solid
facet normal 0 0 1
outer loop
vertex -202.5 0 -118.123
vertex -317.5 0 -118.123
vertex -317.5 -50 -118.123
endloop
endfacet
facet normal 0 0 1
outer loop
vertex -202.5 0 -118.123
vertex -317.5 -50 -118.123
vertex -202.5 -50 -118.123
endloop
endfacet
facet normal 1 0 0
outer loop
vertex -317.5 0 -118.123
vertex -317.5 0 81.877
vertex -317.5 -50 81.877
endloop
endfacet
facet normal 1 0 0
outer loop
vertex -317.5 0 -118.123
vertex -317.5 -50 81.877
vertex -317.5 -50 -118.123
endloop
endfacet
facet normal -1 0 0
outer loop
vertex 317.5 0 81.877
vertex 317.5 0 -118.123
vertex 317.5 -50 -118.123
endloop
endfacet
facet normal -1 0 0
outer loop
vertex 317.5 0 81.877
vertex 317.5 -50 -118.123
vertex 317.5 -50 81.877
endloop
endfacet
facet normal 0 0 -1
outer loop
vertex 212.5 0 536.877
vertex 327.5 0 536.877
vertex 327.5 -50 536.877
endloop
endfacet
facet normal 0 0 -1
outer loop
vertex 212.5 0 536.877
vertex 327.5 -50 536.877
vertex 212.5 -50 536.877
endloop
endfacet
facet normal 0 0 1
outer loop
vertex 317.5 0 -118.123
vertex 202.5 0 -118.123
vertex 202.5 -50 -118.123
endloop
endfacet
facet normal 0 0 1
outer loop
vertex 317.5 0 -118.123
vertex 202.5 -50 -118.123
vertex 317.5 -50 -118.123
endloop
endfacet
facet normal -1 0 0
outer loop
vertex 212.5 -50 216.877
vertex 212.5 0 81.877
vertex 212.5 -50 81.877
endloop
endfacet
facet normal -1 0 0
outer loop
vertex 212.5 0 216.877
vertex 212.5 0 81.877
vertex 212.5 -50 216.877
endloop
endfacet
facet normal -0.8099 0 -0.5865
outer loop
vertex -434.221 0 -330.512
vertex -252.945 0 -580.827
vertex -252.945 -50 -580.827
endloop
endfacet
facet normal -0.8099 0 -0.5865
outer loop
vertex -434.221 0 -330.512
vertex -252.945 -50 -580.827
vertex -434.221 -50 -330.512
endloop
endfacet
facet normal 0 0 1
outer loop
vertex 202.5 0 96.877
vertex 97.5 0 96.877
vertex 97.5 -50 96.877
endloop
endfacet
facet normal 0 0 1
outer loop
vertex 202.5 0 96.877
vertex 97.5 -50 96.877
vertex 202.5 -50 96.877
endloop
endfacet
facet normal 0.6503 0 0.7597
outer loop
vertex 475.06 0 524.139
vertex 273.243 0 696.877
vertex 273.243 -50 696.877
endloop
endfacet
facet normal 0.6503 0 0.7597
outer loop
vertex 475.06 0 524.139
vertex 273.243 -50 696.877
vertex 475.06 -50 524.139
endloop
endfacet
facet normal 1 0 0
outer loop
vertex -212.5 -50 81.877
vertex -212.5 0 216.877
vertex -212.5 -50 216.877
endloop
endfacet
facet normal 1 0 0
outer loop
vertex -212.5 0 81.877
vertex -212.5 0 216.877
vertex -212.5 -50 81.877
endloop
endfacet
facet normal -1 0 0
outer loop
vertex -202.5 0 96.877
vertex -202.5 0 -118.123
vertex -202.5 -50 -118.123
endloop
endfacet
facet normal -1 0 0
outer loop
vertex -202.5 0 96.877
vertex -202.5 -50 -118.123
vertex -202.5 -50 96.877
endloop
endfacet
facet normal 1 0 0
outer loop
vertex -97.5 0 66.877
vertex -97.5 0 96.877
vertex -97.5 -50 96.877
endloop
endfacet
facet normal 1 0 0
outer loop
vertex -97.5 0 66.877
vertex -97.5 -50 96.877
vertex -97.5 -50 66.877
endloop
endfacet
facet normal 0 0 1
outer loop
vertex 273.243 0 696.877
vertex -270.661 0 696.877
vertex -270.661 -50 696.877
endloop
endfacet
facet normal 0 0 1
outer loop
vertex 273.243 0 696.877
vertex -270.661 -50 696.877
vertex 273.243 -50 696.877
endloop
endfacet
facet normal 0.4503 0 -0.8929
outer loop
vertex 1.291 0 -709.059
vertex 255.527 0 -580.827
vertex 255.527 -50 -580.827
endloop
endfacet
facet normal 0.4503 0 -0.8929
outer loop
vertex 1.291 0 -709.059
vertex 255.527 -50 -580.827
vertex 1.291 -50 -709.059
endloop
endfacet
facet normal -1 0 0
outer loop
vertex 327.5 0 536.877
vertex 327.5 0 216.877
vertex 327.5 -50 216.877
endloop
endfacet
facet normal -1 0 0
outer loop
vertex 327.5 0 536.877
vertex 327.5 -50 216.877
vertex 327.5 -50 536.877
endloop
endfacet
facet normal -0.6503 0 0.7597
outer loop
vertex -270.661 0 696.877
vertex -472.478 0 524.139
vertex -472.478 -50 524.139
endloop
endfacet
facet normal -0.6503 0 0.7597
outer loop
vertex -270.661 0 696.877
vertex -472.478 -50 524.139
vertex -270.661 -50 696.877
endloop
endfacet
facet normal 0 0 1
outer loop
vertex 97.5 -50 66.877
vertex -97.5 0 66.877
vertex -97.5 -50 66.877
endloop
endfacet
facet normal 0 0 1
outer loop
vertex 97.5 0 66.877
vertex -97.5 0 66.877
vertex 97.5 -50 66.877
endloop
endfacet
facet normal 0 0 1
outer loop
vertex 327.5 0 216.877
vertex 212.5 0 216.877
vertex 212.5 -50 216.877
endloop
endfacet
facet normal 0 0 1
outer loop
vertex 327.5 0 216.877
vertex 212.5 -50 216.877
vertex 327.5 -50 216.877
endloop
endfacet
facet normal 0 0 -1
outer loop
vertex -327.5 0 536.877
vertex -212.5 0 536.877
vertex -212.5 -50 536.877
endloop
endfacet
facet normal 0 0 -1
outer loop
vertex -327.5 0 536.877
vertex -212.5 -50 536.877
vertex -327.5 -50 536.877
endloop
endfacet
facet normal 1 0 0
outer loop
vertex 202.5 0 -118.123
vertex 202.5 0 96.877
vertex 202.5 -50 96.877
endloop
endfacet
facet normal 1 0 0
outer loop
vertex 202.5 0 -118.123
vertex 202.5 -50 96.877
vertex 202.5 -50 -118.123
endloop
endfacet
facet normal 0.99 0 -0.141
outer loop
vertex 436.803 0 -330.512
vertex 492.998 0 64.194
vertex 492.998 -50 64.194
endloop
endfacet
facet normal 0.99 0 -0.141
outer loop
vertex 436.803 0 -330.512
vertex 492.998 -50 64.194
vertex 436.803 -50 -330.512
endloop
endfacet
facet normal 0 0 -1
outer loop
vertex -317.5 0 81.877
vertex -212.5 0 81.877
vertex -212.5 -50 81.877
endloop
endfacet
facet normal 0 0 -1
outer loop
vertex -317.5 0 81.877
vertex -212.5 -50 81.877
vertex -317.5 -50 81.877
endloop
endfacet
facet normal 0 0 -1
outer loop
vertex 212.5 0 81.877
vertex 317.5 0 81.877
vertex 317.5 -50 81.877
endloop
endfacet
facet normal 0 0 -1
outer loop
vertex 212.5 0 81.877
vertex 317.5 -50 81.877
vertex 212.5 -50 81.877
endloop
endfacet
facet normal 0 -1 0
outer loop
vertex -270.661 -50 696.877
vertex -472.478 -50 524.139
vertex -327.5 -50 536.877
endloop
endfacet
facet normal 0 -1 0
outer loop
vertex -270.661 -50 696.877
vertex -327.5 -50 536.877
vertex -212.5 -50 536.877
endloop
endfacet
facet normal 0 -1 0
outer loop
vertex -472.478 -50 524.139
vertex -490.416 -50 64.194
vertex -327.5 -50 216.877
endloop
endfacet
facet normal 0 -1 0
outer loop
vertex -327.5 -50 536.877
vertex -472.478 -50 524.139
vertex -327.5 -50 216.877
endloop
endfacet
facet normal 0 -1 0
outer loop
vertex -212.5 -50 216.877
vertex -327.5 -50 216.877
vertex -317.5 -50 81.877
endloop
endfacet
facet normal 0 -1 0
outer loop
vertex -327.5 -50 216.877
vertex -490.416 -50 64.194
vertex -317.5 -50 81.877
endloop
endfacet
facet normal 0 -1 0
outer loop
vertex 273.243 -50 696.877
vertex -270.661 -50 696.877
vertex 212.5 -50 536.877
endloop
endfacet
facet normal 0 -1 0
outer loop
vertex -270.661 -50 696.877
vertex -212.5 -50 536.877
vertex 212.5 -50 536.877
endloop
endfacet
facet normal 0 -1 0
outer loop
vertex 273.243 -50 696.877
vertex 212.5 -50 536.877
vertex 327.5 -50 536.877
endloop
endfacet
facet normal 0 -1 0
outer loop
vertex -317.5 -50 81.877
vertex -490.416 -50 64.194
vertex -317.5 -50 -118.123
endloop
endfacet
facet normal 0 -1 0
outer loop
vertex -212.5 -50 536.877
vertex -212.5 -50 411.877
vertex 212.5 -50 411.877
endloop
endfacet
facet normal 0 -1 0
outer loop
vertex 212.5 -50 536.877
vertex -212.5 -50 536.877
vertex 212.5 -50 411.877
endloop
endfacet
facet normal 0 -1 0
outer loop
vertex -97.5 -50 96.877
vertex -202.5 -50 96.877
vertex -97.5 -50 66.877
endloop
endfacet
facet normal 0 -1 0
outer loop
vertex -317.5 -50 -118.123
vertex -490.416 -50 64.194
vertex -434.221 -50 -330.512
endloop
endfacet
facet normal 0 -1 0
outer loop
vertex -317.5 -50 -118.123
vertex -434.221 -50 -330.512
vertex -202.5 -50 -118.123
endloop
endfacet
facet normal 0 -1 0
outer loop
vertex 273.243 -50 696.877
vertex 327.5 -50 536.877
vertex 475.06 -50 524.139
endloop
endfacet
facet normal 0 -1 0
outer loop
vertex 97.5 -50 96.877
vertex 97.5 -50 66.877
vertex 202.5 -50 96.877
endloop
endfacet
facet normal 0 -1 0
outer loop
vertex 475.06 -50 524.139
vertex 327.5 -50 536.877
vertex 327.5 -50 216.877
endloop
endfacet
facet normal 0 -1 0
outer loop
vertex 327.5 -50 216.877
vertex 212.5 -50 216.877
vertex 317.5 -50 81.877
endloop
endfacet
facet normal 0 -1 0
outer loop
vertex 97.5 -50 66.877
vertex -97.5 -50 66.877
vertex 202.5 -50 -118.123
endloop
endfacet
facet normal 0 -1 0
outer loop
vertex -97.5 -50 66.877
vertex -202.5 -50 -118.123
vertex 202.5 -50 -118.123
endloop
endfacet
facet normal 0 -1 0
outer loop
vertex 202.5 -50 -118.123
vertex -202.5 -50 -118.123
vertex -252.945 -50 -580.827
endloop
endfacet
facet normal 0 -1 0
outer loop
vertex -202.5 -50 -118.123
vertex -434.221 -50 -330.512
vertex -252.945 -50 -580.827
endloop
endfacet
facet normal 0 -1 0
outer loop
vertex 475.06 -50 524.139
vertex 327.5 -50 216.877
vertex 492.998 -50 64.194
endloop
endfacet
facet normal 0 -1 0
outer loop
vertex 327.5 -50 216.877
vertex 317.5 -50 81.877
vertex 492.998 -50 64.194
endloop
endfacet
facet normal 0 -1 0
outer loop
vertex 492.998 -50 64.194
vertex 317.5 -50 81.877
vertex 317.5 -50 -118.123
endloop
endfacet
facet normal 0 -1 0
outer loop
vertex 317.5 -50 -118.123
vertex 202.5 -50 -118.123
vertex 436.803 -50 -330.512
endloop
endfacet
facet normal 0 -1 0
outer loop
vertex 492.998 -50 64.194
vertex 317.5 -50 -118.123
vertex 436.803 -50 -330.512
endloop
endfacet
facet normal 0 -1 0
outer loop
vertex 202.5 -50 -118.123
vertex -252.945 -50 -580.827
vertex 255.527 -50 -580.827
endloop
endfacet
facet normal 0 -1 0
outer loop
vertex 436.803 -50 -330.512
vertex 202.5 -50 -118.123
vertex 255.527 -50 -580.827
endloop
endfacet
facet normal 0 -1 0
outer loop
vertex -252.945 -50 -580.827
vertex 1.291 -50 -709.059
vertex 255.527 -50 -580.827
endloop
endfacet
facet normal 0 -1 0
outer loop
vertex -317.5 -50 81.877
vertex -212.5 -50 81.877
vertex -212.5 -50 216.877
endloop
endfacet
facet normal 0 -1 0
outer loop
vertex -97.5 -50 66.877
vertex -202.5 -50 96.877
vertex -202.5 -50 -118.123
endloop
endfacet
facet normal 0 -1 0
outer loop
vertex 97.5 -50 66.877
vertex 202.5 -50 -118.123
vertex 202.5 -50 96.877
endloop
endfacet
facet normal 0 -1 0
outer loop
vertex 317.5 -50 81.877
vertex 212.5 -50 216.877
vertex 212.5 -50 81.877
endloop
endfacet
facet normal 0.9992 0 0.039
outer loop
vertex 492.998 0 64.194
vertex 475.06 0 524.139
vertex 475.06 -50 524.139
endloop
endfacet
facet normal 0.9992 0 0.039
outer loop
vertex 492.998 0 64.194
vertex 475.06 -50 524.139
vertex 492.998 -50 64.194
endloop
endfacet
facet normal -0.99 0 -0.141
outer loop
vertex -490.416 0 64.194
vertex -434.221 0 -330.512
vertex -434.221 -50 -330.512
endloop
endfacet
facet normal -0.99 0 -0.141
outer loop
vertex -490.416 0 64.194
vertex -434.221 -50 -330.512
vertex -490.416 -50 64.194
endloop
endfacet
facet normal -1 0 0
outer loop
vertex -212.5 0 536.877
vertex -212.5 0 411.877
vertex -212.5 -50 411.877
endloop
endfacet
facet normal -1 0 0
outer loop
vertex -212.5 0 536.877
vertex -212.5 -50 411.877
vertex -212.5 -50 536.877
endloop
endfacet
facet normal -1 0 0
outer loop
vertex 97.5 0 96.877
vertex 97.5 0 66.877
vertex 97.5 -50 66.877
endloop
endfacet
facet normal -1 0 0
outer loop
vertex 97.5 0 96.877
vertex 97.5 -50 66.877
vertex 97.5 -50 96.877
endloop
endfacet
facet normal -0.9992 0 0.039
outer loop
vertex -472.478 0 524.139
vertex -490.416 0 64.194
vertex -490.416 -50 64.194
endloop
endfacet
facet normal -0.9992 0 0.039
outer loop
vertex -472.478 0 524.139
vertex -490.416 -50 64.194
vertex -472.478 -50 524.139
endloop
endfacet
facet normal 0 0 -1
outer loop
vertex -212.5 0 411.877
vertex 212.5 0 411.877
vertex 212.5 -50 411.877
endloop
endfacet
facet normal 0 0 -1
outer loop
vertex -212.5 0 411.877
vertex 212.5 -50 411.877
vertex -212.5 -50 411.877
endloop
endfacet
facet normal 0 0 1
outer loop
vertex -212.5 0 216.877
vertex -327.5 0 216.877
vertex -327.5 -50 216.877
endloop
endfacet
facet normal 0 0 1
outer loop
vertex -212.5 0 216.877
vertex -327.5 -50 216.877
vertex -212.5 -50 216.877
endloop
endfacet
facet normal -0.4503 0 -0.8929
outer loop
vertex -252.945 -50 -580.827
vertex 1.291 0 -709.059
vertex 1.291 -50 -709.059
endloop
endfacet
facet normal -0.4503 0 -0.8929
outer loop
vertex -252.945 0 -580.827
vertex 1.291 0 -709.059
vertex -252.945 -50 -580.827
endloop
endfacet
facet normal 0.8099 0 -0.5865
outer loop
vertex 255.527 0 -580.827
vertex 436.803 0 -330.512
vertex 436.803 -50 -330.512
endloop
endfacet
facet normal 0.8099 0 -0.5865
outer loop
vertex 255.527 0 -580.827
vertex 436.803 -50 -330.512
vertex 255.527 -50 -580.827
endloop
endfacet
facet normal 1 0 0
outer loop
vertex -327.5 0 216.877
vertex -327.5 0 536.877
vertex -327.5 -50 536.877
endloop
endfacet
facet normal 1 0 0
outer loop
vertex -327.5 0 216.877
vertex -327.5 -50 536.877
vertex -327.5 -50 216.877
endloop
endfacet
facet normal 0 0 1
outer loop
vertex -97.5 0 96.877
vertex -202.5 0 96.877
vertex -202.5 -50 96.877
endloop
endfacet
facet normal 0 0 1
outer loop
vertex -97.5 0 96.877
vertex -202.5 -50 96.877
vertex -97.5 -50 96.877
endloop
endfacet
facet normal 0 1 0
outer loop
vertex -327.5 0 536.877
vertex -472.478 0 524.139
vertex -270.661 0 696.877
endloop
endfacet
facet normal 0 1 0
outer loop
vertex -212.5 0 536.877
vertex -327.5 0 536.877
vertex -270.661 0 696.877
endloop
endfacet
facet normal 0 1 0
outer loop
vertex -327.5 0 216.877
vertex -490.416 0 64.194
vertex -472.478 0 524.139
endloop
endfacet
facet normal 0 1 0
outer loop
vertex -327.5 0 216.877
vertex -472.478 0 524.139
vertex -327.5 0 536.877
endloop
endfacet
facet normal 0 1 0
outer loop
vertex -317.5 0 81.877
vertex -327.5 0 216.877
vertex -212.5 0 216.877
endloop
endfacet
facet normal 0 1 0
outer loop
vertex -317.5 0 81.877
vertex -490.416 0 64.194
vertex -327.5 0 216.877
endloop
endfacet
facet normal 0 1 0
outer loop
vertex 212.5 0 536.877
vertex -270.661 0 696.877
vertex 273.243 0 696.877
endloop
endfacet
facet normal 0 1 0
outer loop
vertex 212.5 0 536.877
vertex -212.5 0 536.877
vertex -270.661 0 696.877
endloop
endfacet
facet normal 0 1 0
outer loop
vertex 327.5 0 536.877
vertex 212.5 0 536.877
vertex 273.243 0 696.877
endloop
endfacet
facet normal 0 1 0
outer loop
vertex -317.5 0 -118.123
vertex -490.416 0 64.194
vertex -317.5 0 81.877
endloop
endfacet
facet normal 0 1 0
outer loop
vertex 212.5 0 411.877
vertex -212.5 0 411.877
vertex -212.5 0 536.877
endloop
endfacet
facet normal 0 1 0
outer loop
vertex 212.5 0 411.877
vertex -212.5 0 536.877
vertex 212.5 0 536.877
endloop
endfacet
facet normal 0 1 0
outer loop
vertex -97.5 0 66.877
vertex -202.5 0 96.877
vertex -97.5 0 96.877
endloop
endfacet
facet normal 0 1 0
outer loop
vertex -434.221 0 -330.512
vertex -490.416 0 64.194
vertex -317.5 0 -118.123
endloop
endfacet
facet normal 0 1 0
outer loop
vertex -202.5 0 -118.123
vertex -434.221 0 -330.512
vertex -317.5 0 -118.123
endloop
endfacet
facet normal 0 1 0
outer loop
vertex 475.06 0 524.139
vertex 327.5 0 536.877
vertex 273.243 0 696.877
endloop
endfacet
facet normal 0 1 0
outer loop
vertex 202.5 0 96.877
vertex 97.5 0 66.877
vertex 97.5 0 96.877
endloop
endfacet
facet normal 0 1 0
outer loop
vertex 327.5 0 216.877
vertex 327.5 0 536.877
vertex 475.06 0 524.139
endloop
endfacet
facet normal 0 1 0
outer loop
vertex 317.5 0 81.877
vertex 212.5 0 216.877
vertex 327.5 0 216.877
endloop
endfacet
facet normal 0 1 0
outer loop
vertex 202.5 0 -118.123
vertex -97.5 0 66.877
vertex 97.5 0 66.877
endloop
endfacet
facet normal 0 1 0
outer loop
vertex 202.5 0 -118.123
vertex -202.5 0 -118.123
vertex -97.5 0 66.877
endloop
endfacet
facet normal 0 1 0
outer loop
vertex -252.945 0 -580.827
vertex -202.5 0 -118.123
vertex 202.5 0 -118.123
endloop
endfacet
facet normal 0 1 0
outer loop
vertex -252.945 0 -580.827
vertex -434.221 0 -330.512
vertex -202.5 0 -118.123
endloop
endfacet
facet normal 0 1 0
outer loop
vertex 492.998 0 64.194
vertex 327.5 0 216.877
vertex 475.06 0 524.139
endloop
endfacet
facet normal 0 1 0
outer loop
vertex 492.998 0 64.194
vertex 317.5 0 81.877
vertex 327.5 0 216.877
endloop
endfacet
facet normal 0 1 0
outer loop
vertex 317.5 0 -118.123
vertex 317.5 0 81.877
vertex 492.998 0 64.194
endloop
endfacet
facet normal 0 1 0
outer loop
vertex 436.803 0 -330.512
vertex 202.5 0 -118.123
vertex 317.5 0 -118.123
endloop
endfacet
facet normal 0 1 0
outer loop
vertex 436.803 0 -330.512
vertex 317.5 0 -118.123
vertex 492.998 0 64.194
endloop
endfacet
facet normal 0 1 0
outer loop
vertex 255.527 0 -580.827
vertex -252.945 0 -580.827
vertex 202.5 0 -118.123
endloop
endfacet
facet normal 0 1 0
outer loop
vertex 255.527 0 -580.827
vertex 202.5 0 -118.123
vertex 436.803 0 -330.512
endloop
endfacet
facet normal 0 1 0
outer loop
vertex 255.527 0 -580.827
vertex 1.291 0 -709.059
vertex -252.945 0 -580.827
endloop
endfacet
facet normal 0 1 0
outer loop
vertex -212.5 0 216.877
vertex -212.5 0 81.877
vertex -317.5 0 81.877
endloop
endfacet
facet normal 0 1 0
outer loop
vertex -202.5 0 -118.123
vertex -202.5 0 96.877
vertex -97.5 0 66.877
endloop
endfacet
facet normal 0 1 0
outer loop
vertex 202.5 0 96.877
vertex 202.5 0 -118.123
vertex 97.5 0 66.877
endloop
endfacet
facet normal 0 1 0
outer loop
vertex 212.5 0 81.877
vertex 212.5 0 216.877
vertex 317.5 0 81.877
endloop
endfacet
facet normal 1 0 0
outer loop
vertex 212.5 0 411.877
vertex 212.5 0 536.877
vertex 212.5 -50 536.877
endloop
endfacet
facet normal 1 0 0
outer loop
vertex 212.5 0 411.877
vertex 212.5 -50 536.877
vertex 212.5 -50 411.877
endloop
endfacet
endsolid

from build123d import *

# Parameters (mm, degrees)
BOSS_EXTRUDE1_DEPTH = 50


with BuildPart() as part:
    # Sketch1 → Boss-Extrude1 (new body)
    with BuildSketch(Plane(origin=(0, 0, 0), x_dir=(1, 0, 0), z_dir=(0, 1, 0))):
        Polygon((-434.22123396, 330.511591748), (-490.415824699, -64.194072769), (-472.477870031, -524.138824529), (-270.660991621, -696.876695154), (273.24324441, -696.876695154), (475.06012282, -524.138824529), (492.998077488, -64.194072769), (436.803486749, 330.511591748), (255.52688097, 580.827312496), (1.291126394, 709.058947943), (-252.944628181, 580.827312496), align=None)
        Polygon((327.5, -536.876695154), (212.5, -536.876695154), (212.5, -411.876695154), (97.5, -411.876695154), (-97.5, -411.876695154), (-212.5, -411.876695154), (-212.5, -536.876695154), (-327.5, -536.876695154), (-327.5, -216.876695154), (-212.5, -216.876695154), (-212.5, -96.876695154), (-212.5, -81.876695154), (-317.5, -81.876695154), (-317.5, 118.123304846), (-202.5, 118.123304846), (-202.5, -81.876695154), (-202.5, -96.876695154), (-97.5, -96.876695154), (-97.5, -66.876695154), (97.5, -66.876695154), (97.5, -96.876695154), (202.5, -96.876695154), (202.5, -81.876695154), (202.5, 118.123304846), (317.5, 118.123304846), (317.5, -81.876695154), (212.5, -81.876695154), (212.5, -96.876695154), (212.5, -216.876695154), (327.5, -216.876695154), align=None, mode=Mode.SUBTRACT)
    extrude(amount=-BOSS_EXTRUDE1_DEPTH)


solid = part.part
